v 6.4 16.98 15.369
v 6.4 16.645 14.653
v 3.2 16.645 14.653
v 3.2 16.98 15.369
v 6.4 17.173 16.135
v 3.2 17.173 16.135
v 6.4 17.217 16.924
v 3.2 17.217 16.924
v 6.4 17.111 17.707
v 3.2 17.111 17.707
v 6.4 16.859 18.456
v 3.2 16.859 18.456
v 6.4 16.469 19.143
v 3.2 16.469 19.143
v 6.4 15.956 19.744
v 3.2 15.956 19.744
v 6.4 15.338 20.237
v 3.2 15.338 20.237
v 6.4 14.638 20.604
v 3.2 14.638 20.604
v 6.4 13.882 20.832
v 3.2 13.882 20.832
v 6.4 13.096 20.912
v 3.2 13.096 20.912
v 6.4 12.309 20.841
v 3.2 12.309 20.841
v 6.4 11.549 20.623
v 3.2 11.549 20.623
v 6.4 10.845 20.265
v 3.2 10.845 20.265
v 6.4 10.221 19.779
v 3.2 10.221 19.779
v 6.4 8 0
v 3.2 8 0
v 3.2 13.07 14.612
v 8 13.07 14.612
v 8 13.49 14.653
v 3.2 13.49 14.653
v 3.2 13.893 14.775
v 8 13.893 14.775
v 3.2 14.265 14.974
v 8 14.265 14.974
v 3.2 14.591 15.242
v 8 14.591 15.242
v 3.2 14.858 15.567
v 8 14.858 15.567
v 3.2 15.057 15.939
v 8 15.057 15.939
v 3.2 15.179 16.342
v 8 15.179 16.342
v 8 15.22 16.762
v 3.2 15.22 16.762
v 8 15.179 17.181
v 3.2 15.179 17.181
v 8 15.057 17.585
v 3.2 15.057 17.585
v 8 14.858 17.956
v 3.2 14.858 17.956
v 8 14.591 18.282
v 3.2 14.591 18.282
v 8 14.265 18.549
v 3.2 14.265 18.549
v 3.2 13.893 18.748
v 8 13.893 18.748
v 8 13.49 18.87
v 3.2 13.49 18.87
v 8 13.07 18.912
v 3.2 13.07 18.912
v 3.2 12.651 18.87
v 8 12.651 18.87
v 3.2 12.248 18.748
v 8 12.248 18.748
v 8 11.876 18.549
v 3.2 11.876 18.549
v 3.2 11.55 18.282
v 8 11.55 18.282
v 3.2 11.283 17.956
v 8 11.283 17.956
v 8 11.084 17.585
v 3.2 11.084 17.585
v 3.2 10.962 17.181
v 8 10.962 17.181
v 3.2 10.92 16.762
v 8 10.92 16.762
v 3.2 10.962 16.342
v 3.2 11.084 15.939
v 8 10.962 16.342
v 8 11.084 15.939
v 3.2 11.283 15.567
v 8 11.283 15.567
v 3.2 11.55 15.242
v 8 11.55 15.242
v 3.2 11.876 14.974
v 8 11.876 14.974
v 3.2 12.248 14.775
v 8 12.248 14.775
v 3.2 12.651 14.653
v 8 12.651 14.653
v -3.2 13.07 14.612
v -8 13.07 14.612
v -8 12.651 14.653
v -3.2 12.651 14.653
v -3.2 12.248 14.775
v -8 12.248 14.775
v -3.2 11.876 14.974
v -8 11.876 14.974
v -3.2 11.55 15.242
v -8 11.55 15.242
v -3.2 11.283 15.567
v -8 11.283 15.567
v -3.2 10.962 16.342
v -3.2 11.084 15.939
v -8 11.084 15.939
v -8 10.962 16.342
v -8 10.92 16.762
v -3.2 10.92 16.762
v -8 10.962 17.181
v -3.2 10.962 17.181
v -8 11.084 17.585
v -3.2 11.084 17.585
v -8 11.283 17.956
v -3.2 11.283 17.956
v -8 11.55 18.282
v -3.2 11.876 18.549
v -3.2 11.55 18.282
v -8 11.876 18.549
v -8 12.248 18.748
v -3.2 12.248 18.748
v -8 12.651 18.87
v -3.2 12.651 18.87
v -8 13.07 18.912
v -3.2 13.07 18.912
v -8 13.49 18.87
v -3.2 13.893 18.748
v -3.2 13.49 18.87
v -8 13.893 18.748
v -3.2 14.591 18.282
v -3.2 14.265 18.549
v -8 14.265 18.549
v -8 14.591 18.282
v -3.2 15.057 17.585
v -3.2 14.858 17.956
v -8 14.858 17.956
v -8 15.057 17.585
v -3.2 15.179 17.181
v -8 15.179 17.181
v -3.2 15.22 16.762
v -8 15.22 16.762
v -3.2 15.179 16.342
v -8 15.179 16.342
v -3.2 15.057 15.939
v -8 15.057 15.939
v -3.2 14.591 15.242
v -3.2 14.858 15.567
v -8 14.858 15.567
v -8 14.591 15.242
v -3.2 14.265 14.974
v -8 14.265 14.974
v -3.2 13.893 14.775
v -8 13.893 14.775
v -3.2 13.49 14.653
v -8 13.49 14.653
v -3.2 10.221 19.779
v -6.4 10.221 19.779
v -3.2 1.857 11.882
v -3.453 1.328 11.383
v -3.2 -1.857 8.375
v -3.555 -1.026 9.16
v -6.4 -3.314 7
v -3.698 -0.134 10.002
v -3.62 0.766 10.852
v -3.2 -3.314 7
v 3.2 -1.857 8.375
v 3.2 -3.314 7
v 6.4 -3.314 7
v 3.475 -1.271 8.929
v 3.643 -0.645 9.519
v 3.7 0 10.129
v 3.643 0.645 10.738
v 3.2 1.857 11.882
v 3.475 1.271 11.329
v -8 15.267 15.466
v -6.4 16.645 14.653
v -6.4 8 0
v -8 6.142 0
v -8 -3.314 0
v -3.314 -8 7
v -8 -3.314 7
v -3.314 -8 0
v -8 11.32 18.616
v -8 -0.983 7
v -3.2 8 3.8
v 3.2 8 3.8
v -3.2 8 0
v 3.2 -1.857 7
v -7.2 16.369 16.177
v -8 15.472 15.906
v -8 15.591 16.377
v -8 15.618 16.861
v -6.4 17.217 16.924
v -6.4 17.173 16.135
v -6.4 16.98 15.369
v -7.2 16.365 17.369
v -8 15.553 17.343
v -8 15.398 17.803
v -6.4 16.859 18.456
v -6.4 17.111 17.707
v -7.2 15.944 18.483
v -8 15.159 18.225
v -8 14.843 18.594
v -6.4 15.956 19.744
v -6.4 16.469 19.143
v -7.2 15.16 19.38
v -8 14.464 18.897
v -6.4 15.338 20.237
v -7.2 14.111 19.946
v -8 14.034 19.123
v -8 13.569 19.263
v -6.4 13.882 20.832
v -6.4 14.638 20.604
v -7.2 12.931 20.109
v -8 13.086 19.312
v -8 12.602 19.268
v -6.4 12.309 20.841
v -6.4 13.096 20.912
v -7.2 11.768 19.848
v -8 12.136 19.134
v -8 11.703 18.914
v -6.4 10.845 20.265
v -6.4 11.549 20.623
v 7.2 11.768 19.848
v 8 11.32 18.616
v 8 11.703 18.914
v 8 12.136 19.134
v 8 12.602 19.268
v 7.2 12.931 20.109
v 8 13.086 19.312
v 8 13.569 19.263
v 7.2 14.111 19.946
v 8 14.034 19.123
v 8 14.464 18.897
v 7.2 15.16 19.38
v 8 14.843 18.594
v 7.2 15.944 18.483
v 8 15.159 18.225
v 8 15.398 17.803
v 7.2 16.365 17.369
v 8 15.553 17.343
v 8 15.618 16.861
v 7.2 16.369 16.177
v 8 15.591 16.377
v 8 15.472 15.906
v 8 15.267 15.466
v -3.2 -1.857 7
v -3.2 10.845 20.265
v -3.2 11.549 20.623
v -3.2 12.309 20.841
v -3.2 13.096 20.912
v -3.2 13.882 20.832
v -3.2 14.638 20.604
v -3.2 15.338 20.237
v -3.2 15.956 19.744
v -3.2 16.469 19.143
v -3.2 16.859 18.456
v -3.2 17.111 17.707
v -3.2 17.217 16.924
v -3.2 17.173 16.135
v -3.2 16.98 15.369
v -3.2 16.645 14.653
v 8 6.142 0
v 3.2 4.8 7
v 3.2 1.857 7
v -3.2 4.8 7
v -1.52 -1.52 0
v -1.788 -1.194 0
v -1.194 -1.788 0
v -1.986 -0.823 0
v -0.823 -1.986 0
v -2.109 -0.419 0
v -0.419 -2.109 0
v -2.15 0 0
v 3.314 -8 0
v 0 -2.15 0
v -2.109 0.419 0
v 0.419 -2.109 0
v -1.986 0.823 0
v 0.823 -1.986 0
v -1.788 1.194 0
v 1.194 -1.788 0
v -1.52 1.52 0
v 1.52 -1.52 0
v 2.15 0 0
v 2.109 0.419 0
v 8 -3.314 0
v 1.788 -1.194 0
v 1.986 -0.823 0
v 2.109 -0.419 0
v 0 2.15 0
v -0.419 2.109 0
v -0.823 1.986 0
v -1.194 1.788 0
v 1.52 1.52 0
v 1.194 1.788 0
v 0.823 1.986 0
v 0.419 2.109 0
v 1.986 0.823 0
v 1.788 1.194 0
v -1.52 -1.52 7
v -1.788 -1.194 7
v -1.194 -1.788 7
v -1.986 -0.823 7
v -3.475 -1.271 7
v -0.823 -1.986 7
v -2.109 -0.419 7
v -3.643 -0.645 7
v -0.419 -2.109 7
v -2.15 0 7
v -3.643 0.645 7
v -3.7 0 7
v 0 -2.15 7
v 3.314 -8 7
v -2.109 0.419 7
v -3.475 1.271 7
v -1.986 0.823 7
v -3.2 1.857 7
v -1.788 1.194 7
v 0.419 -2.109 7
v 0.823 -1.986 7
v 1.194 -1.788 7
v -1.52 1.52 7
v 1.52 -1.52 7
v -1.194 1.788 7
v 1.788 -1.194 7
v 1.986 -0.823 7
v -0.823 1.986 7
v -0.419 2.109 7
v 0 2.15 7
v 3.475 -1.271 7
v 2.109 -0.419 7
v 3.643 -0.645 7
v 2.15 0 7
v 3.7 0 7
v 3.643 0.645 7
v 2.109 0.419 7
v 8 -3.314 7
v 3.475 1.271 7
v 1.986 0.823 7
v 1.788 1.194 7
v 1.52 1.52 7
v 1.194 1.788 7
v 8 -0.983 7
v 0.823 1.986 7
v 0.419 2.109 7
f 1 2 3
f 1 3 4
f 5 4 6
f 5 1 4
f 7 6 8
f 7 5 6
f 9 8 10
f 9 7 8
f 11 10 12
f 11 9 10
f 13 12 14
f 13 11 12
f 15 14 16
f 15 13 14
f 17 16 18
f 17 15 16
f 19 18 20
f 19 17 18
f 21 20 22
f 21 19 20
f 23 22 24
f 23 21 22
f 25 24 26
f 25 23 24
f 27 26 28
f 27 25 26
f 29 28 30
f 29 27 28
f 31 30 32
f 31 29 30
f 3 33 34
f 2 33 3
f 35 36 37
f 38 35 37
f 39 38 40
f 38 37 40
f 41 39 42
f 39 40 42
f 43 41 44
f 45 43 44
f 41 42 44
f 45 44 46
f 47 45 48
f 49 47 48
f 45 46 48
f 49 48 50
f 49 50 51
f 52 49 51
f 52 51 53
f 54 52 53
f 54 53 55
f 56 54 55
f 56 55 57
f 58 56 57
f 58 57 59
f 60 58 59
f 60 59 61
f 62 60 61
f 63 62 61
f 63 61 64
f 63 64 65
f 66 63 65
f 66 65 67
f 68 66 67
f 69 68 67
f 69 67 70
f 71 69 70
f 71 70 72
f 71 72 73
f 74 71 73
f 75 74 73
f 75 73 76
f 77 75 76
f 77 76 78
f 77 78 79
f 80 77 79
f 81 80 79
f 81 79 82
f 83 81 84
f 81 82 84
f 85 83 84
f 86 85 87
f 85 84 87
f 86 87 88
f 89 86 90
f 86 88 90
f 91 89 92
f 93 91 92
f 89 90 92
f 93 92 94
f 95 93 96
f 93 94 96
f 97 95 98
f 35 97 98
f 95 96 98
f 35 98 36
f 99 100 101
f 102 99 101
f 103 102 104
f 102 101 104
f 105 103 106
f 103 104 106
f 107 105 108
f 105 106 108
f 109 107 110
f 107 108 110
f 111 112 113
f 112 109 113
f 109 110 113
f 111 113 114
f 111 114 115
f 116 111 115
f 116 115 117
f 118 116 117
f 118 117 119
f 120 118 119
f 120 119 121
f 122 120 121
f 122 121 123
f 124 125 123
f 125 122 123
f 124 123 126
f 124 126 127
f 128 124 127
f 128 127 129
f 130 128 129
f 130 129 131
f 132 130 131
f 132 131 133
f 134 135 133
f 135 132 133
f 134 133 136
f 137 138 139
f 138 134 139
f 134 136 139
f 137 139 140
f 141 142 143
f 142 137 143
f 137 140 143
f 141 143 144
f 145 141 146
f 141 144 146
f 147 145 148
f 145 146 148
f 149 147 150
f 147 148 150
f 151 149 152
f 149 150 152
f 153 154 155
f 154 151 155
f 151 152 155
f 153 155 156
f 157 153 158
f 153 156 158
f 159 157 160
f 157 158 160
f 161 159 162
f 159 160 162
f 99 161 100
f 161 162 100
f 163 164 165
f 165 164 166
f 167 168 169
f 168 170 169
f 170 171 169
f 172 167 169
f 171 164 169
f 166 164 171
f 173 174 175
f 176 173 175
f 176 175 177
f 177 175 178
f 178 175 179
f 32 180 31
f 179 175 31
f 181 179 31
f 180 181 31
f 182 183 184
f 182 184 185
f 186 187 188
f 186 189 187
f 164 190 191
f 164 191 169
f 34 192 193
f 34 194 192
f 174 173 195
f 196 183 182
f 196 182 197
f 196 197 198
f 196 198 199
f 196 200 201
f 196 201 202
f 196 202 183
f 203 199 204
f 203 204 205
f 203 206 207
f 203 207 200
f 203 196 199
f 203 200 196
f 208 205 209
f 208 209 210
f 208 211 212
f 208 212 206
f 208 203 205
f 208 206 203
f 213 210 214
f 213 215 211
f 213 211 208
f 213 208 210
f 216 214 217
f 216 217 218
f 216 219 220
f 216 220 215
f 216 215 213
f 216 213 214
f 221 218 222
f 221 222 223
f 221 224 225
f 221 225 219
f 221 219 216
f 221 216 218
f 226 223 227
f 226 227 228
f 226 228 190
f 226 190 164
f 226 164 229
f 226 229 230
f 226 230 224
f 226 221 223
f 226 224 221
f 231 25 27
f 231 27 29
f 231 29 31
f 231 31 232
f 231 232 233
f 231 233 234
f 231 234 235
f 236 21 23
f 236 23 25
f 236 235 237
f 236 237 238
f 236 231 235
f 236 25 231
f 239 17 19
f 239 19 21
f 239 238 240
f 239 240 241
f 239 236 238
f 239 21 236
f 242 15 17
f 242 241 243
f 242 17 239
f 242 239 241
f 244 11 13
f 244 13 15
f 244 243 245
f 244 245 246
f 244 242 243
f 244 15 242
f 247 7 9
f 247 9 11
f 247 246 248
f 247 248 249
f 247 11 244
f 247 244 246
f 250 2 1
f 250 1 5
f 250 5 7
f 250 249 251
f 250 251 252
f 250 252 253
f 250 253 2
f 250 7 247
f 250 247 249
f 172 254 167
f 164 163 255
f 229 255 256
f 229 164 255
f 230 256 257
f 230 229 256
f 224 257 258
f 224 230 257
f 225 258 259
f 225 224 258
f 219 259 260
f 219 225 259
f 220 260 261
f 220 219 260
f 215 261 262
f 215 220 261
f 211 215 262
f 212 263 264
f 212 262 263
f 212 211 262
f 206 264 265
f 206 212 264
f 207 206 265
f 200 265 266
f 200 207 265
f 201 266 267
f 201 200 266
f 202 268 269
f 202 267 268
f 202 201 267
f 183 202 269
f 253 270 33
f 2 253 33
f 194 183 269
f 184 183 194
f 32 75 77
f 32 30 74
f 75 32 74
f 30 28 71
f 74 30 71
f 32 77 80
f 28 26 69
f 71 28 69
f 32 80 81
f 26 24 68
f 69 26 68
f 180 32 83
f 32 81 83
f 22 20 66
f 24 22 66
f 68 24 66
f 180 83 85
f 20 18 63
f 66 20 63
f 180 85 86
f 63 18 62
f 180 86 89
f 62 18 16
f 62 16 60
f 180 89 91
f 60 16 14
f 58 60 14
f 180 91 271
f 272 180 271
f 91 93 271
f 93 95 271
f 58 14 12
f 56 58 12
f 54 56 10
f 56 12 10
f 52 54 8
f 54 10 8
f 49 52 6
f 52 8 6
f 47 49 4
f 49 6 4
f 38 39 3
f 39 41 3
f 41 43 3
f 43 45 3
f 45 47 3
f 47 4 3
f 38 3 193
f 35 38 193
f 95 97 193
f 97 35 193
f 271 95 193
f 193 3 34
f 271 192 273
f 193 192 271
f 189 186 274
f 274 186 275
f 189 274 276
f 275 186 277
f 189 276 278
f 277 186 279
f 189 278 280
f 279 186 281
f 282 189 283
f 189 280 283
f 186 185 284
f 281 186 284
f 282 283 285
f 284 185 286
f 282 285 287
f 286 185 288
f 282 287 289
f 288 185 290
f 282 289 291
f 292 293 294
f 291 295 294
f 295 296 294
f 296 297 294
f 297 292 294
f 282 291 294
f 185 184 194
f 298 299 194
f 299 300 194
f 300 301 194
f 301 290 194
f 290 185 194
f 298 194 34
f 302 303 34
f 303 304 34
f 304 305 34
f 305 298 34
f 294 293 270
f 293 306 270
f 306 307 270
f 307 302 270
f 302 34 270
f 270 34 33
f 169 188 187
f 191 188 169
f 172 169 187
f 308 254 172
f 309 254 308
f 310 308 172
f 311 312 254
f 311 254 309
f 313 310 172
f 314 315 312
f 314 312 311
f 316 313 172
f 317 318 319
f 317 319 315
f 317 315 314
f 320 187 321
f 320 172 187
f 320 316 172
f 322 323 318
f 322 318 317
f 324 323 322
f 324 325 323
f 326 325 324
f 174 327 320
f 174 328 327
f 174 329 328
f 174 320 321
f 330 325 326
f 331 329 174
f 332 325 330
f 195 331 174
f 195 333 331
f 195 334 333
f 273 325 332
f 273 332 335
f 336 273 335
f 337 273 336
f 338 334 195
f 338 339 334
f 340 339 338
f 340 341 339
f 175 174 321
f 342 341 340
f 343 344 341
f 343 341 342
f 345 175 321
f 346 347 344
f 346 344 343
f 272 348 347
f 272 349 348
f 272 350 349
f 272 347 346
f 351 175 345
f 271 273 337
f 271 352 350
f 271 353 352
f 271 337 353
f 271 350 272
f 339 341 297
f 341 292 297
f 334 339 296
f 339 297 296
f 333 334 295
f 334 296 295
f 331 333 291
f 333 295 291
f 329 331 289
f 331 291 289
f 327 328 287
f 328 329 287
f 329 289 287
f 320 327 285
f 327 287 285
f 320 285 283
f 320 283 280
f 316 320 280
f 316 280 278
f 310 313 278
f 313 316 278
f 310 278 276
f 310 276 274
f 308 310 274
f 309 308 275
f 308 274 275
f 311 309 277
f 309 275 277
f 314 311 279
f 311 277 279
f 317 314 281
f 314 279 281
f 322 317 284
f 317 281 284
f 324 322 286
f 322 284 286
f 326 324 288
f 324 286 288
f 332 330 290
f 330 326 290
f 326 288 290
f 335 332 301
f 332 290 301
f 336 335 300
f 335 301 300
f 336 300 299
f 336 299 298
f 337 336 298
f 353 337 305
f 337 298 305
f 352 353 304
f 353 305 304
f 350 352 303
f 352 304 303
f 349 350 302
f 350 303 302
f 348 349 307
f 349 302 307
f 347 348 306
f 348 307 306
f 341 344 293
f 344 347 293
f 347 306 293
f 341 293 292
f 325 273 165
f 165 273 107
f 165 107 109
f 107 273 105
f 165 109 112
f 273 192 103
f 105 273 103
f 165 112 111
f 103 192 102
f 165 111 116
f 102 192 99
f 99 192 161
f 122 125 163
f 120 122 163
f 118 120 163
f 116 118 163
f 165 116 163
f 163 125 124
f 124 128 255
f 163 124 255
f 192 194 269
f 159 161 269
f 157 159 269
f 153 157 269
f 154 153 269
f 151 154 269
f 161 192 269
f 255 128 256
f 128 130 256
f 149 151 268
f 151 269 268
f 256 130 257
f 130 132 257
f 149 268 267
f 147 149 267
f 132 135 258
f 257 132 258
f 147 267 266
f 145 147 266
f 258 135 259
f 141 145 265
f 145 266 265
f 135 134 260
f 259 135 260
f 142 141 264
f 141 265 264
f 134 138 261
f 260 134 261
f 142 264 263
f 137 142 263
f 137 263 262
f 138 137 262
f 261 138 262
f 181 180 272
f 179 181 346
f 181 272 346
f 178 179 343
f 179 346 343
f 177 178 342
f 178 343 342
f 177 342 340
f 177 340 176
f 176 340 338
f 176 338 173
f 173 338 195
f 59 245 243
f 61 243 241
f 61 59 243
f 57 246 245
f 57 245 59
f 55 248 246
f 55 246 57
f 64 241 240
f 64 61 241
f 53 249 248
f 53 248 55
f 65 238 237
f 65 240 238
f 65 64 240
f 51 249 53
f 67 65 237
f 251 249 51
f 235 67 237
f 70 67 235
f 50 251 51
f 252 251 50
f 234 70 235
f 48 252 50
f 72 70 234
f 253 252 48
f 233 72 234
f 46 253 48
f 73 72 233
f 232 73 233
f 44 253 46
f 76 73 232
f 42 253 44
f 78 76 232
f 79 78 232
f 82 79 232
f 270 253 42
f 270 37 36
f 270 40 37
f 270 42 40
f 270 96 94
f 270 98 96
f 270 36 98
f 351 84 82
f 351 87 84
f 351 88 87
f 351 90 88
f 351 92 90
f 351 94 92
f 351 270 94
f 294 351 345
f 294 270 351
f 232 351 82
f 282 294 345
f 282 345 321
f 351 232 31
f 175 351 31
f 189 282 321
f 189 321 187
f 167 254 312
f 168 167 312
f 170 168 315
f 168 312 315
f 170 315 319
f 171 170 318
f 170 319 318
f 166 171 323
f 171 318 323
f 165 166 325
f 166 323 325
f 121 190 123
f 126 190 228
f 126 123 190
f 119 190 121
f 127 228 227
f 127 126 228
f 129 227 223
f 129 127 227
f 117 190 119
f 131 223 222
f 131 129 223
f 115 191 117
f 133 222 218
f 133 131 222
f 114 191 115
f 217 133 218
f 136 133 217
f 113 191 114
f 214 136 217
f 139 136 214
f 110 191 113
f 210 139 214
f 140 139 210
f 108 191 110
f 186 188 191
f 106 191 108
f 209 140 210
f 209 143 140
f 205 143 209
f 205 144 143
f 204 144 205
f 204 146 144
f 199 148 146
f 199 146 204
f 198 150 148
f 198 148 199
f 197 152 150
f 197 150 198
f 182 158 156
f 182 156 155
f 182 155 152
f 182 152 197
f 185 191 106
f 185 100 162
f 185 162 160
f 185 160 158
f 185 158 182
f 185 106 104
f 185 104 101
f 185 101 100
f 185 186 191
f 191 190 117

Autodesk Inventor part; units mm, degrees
ref_plane "YZ Plane" through (0, 0, 0) normal (1, 0, 0) x (0, 1, 0)
ref_plane "XZ Plane" through (0, 0, 0) normal (0, 1, 0) x (-1, 0, 0)
ref_plane "XY Plane" through (0, 0, 0) normal (0, 0, 1) x (1, 0, 0)
sketch "Sketch1" plane through (0, 0, 0) normal (0, 0, 1) x (1, 0, 0)
  circle A0 centre (0, 0) radius 2.15
  line L0 (3.3137, 8) -> (8, 3.3137)
  line L1 (8, 3.3137) -> (8, -3.3137)
  line L2 (8, -3.3137) -> (3.3137, -8)
  line L3 (3.3137, -8) -> (-3.3137, -8)
  line L4 (-3.3137, -8) -> (-8, -3.3137)
  line L5 (-8, -3.3137) -> (-8, 3.3137)
  line L6 (-8, 3.3137) -> (-3.3137, 8)
  line L7 (-3.3137, 8) -> (3.3137, 8)
  dimension "d0" = 4.3
  dimension "d1" = 16
extrude "Extrusion1" add sketch "Sketch1" along normal blind 7
sketch "Sketch2" plane through (8, -3.3137, 0) normal (1, 0, 0) x (0, 0, -1)
  line L0 (0, 0) -> (-7, 0) projected
  line L1 (0, 6.6274) -> (0, 0) projected
  line L2 (0, 11.3137) -> (0, 6.6274) projected
  circle A0 centre (-16.7618, 16.384) radius 2.15
  circle A1 centre (-16.7618, 16.384) radius 4.15
  line L3 (0, 11.3137) -> (-7, 11.3137) projected
  line L4 (0, 11.3137) -> (-14.6531, 19.9583)
  line L5 (-7, 0) -> (-7, -4.6863) projected
  line L6 (-7, 0) -> (-19.7793, 13.5349)
  line L7 (-7, 1.1637) -> (-7, 5.4637) projected
  line L8 (-7, 3.3137) -> (-11, 3.3137)
  line L9 (-11, 3.3137) -> (-11, 7.0137)
  circle A2 centre (-16.7618, 16.384) radius 11
  point P0 (0, 3.3137)
  dimension "d4" = 4.3
  dimension "d6" = 2
  dimension "d17" = 4
  dimension "d18" = 3.7
  dimension "d19" = 22
extrude "Extrusion2" add sketch "Sketch2" against normal blind 4.8 contours L0 L6 L9 A2 L3 L2 L1 | L3 A2 L4 | L6 A2 L9 | A2 L6 A1 L4 | A1 picked at (-9.3805, 11.8131)
mirror "Mirror1" about plane through (0, 0, 0) normal (1, 0, 0) of "Extrusion2"
sketch "Sketch4" plane through (0, 0, 7) normal (0, 0, 1) x (1, 0, 0)
  circle A0 centre (0, 0) radius 3.7
  dimension "d14" = 7.4
extrude "Extrusion4" cut sketch "Sketch4" along normal through all
chamfer "Chamfer2" distance 1.6 angle 45 6 edges at (8, 15.6589, 20.0055) (8, 3.4538, 13.3896) (8, 12.3223, 7.3265) (-8, 3.4538, 13.3896) (-8, 15.6589, 20.0055) (-8, 12.3223, 7.3265)
chamfer "Chamfer3" distance 3.2 angle 45 1 edges at (0, 8, 7)
properties part number "kladka-midwheel-atTprofile"
